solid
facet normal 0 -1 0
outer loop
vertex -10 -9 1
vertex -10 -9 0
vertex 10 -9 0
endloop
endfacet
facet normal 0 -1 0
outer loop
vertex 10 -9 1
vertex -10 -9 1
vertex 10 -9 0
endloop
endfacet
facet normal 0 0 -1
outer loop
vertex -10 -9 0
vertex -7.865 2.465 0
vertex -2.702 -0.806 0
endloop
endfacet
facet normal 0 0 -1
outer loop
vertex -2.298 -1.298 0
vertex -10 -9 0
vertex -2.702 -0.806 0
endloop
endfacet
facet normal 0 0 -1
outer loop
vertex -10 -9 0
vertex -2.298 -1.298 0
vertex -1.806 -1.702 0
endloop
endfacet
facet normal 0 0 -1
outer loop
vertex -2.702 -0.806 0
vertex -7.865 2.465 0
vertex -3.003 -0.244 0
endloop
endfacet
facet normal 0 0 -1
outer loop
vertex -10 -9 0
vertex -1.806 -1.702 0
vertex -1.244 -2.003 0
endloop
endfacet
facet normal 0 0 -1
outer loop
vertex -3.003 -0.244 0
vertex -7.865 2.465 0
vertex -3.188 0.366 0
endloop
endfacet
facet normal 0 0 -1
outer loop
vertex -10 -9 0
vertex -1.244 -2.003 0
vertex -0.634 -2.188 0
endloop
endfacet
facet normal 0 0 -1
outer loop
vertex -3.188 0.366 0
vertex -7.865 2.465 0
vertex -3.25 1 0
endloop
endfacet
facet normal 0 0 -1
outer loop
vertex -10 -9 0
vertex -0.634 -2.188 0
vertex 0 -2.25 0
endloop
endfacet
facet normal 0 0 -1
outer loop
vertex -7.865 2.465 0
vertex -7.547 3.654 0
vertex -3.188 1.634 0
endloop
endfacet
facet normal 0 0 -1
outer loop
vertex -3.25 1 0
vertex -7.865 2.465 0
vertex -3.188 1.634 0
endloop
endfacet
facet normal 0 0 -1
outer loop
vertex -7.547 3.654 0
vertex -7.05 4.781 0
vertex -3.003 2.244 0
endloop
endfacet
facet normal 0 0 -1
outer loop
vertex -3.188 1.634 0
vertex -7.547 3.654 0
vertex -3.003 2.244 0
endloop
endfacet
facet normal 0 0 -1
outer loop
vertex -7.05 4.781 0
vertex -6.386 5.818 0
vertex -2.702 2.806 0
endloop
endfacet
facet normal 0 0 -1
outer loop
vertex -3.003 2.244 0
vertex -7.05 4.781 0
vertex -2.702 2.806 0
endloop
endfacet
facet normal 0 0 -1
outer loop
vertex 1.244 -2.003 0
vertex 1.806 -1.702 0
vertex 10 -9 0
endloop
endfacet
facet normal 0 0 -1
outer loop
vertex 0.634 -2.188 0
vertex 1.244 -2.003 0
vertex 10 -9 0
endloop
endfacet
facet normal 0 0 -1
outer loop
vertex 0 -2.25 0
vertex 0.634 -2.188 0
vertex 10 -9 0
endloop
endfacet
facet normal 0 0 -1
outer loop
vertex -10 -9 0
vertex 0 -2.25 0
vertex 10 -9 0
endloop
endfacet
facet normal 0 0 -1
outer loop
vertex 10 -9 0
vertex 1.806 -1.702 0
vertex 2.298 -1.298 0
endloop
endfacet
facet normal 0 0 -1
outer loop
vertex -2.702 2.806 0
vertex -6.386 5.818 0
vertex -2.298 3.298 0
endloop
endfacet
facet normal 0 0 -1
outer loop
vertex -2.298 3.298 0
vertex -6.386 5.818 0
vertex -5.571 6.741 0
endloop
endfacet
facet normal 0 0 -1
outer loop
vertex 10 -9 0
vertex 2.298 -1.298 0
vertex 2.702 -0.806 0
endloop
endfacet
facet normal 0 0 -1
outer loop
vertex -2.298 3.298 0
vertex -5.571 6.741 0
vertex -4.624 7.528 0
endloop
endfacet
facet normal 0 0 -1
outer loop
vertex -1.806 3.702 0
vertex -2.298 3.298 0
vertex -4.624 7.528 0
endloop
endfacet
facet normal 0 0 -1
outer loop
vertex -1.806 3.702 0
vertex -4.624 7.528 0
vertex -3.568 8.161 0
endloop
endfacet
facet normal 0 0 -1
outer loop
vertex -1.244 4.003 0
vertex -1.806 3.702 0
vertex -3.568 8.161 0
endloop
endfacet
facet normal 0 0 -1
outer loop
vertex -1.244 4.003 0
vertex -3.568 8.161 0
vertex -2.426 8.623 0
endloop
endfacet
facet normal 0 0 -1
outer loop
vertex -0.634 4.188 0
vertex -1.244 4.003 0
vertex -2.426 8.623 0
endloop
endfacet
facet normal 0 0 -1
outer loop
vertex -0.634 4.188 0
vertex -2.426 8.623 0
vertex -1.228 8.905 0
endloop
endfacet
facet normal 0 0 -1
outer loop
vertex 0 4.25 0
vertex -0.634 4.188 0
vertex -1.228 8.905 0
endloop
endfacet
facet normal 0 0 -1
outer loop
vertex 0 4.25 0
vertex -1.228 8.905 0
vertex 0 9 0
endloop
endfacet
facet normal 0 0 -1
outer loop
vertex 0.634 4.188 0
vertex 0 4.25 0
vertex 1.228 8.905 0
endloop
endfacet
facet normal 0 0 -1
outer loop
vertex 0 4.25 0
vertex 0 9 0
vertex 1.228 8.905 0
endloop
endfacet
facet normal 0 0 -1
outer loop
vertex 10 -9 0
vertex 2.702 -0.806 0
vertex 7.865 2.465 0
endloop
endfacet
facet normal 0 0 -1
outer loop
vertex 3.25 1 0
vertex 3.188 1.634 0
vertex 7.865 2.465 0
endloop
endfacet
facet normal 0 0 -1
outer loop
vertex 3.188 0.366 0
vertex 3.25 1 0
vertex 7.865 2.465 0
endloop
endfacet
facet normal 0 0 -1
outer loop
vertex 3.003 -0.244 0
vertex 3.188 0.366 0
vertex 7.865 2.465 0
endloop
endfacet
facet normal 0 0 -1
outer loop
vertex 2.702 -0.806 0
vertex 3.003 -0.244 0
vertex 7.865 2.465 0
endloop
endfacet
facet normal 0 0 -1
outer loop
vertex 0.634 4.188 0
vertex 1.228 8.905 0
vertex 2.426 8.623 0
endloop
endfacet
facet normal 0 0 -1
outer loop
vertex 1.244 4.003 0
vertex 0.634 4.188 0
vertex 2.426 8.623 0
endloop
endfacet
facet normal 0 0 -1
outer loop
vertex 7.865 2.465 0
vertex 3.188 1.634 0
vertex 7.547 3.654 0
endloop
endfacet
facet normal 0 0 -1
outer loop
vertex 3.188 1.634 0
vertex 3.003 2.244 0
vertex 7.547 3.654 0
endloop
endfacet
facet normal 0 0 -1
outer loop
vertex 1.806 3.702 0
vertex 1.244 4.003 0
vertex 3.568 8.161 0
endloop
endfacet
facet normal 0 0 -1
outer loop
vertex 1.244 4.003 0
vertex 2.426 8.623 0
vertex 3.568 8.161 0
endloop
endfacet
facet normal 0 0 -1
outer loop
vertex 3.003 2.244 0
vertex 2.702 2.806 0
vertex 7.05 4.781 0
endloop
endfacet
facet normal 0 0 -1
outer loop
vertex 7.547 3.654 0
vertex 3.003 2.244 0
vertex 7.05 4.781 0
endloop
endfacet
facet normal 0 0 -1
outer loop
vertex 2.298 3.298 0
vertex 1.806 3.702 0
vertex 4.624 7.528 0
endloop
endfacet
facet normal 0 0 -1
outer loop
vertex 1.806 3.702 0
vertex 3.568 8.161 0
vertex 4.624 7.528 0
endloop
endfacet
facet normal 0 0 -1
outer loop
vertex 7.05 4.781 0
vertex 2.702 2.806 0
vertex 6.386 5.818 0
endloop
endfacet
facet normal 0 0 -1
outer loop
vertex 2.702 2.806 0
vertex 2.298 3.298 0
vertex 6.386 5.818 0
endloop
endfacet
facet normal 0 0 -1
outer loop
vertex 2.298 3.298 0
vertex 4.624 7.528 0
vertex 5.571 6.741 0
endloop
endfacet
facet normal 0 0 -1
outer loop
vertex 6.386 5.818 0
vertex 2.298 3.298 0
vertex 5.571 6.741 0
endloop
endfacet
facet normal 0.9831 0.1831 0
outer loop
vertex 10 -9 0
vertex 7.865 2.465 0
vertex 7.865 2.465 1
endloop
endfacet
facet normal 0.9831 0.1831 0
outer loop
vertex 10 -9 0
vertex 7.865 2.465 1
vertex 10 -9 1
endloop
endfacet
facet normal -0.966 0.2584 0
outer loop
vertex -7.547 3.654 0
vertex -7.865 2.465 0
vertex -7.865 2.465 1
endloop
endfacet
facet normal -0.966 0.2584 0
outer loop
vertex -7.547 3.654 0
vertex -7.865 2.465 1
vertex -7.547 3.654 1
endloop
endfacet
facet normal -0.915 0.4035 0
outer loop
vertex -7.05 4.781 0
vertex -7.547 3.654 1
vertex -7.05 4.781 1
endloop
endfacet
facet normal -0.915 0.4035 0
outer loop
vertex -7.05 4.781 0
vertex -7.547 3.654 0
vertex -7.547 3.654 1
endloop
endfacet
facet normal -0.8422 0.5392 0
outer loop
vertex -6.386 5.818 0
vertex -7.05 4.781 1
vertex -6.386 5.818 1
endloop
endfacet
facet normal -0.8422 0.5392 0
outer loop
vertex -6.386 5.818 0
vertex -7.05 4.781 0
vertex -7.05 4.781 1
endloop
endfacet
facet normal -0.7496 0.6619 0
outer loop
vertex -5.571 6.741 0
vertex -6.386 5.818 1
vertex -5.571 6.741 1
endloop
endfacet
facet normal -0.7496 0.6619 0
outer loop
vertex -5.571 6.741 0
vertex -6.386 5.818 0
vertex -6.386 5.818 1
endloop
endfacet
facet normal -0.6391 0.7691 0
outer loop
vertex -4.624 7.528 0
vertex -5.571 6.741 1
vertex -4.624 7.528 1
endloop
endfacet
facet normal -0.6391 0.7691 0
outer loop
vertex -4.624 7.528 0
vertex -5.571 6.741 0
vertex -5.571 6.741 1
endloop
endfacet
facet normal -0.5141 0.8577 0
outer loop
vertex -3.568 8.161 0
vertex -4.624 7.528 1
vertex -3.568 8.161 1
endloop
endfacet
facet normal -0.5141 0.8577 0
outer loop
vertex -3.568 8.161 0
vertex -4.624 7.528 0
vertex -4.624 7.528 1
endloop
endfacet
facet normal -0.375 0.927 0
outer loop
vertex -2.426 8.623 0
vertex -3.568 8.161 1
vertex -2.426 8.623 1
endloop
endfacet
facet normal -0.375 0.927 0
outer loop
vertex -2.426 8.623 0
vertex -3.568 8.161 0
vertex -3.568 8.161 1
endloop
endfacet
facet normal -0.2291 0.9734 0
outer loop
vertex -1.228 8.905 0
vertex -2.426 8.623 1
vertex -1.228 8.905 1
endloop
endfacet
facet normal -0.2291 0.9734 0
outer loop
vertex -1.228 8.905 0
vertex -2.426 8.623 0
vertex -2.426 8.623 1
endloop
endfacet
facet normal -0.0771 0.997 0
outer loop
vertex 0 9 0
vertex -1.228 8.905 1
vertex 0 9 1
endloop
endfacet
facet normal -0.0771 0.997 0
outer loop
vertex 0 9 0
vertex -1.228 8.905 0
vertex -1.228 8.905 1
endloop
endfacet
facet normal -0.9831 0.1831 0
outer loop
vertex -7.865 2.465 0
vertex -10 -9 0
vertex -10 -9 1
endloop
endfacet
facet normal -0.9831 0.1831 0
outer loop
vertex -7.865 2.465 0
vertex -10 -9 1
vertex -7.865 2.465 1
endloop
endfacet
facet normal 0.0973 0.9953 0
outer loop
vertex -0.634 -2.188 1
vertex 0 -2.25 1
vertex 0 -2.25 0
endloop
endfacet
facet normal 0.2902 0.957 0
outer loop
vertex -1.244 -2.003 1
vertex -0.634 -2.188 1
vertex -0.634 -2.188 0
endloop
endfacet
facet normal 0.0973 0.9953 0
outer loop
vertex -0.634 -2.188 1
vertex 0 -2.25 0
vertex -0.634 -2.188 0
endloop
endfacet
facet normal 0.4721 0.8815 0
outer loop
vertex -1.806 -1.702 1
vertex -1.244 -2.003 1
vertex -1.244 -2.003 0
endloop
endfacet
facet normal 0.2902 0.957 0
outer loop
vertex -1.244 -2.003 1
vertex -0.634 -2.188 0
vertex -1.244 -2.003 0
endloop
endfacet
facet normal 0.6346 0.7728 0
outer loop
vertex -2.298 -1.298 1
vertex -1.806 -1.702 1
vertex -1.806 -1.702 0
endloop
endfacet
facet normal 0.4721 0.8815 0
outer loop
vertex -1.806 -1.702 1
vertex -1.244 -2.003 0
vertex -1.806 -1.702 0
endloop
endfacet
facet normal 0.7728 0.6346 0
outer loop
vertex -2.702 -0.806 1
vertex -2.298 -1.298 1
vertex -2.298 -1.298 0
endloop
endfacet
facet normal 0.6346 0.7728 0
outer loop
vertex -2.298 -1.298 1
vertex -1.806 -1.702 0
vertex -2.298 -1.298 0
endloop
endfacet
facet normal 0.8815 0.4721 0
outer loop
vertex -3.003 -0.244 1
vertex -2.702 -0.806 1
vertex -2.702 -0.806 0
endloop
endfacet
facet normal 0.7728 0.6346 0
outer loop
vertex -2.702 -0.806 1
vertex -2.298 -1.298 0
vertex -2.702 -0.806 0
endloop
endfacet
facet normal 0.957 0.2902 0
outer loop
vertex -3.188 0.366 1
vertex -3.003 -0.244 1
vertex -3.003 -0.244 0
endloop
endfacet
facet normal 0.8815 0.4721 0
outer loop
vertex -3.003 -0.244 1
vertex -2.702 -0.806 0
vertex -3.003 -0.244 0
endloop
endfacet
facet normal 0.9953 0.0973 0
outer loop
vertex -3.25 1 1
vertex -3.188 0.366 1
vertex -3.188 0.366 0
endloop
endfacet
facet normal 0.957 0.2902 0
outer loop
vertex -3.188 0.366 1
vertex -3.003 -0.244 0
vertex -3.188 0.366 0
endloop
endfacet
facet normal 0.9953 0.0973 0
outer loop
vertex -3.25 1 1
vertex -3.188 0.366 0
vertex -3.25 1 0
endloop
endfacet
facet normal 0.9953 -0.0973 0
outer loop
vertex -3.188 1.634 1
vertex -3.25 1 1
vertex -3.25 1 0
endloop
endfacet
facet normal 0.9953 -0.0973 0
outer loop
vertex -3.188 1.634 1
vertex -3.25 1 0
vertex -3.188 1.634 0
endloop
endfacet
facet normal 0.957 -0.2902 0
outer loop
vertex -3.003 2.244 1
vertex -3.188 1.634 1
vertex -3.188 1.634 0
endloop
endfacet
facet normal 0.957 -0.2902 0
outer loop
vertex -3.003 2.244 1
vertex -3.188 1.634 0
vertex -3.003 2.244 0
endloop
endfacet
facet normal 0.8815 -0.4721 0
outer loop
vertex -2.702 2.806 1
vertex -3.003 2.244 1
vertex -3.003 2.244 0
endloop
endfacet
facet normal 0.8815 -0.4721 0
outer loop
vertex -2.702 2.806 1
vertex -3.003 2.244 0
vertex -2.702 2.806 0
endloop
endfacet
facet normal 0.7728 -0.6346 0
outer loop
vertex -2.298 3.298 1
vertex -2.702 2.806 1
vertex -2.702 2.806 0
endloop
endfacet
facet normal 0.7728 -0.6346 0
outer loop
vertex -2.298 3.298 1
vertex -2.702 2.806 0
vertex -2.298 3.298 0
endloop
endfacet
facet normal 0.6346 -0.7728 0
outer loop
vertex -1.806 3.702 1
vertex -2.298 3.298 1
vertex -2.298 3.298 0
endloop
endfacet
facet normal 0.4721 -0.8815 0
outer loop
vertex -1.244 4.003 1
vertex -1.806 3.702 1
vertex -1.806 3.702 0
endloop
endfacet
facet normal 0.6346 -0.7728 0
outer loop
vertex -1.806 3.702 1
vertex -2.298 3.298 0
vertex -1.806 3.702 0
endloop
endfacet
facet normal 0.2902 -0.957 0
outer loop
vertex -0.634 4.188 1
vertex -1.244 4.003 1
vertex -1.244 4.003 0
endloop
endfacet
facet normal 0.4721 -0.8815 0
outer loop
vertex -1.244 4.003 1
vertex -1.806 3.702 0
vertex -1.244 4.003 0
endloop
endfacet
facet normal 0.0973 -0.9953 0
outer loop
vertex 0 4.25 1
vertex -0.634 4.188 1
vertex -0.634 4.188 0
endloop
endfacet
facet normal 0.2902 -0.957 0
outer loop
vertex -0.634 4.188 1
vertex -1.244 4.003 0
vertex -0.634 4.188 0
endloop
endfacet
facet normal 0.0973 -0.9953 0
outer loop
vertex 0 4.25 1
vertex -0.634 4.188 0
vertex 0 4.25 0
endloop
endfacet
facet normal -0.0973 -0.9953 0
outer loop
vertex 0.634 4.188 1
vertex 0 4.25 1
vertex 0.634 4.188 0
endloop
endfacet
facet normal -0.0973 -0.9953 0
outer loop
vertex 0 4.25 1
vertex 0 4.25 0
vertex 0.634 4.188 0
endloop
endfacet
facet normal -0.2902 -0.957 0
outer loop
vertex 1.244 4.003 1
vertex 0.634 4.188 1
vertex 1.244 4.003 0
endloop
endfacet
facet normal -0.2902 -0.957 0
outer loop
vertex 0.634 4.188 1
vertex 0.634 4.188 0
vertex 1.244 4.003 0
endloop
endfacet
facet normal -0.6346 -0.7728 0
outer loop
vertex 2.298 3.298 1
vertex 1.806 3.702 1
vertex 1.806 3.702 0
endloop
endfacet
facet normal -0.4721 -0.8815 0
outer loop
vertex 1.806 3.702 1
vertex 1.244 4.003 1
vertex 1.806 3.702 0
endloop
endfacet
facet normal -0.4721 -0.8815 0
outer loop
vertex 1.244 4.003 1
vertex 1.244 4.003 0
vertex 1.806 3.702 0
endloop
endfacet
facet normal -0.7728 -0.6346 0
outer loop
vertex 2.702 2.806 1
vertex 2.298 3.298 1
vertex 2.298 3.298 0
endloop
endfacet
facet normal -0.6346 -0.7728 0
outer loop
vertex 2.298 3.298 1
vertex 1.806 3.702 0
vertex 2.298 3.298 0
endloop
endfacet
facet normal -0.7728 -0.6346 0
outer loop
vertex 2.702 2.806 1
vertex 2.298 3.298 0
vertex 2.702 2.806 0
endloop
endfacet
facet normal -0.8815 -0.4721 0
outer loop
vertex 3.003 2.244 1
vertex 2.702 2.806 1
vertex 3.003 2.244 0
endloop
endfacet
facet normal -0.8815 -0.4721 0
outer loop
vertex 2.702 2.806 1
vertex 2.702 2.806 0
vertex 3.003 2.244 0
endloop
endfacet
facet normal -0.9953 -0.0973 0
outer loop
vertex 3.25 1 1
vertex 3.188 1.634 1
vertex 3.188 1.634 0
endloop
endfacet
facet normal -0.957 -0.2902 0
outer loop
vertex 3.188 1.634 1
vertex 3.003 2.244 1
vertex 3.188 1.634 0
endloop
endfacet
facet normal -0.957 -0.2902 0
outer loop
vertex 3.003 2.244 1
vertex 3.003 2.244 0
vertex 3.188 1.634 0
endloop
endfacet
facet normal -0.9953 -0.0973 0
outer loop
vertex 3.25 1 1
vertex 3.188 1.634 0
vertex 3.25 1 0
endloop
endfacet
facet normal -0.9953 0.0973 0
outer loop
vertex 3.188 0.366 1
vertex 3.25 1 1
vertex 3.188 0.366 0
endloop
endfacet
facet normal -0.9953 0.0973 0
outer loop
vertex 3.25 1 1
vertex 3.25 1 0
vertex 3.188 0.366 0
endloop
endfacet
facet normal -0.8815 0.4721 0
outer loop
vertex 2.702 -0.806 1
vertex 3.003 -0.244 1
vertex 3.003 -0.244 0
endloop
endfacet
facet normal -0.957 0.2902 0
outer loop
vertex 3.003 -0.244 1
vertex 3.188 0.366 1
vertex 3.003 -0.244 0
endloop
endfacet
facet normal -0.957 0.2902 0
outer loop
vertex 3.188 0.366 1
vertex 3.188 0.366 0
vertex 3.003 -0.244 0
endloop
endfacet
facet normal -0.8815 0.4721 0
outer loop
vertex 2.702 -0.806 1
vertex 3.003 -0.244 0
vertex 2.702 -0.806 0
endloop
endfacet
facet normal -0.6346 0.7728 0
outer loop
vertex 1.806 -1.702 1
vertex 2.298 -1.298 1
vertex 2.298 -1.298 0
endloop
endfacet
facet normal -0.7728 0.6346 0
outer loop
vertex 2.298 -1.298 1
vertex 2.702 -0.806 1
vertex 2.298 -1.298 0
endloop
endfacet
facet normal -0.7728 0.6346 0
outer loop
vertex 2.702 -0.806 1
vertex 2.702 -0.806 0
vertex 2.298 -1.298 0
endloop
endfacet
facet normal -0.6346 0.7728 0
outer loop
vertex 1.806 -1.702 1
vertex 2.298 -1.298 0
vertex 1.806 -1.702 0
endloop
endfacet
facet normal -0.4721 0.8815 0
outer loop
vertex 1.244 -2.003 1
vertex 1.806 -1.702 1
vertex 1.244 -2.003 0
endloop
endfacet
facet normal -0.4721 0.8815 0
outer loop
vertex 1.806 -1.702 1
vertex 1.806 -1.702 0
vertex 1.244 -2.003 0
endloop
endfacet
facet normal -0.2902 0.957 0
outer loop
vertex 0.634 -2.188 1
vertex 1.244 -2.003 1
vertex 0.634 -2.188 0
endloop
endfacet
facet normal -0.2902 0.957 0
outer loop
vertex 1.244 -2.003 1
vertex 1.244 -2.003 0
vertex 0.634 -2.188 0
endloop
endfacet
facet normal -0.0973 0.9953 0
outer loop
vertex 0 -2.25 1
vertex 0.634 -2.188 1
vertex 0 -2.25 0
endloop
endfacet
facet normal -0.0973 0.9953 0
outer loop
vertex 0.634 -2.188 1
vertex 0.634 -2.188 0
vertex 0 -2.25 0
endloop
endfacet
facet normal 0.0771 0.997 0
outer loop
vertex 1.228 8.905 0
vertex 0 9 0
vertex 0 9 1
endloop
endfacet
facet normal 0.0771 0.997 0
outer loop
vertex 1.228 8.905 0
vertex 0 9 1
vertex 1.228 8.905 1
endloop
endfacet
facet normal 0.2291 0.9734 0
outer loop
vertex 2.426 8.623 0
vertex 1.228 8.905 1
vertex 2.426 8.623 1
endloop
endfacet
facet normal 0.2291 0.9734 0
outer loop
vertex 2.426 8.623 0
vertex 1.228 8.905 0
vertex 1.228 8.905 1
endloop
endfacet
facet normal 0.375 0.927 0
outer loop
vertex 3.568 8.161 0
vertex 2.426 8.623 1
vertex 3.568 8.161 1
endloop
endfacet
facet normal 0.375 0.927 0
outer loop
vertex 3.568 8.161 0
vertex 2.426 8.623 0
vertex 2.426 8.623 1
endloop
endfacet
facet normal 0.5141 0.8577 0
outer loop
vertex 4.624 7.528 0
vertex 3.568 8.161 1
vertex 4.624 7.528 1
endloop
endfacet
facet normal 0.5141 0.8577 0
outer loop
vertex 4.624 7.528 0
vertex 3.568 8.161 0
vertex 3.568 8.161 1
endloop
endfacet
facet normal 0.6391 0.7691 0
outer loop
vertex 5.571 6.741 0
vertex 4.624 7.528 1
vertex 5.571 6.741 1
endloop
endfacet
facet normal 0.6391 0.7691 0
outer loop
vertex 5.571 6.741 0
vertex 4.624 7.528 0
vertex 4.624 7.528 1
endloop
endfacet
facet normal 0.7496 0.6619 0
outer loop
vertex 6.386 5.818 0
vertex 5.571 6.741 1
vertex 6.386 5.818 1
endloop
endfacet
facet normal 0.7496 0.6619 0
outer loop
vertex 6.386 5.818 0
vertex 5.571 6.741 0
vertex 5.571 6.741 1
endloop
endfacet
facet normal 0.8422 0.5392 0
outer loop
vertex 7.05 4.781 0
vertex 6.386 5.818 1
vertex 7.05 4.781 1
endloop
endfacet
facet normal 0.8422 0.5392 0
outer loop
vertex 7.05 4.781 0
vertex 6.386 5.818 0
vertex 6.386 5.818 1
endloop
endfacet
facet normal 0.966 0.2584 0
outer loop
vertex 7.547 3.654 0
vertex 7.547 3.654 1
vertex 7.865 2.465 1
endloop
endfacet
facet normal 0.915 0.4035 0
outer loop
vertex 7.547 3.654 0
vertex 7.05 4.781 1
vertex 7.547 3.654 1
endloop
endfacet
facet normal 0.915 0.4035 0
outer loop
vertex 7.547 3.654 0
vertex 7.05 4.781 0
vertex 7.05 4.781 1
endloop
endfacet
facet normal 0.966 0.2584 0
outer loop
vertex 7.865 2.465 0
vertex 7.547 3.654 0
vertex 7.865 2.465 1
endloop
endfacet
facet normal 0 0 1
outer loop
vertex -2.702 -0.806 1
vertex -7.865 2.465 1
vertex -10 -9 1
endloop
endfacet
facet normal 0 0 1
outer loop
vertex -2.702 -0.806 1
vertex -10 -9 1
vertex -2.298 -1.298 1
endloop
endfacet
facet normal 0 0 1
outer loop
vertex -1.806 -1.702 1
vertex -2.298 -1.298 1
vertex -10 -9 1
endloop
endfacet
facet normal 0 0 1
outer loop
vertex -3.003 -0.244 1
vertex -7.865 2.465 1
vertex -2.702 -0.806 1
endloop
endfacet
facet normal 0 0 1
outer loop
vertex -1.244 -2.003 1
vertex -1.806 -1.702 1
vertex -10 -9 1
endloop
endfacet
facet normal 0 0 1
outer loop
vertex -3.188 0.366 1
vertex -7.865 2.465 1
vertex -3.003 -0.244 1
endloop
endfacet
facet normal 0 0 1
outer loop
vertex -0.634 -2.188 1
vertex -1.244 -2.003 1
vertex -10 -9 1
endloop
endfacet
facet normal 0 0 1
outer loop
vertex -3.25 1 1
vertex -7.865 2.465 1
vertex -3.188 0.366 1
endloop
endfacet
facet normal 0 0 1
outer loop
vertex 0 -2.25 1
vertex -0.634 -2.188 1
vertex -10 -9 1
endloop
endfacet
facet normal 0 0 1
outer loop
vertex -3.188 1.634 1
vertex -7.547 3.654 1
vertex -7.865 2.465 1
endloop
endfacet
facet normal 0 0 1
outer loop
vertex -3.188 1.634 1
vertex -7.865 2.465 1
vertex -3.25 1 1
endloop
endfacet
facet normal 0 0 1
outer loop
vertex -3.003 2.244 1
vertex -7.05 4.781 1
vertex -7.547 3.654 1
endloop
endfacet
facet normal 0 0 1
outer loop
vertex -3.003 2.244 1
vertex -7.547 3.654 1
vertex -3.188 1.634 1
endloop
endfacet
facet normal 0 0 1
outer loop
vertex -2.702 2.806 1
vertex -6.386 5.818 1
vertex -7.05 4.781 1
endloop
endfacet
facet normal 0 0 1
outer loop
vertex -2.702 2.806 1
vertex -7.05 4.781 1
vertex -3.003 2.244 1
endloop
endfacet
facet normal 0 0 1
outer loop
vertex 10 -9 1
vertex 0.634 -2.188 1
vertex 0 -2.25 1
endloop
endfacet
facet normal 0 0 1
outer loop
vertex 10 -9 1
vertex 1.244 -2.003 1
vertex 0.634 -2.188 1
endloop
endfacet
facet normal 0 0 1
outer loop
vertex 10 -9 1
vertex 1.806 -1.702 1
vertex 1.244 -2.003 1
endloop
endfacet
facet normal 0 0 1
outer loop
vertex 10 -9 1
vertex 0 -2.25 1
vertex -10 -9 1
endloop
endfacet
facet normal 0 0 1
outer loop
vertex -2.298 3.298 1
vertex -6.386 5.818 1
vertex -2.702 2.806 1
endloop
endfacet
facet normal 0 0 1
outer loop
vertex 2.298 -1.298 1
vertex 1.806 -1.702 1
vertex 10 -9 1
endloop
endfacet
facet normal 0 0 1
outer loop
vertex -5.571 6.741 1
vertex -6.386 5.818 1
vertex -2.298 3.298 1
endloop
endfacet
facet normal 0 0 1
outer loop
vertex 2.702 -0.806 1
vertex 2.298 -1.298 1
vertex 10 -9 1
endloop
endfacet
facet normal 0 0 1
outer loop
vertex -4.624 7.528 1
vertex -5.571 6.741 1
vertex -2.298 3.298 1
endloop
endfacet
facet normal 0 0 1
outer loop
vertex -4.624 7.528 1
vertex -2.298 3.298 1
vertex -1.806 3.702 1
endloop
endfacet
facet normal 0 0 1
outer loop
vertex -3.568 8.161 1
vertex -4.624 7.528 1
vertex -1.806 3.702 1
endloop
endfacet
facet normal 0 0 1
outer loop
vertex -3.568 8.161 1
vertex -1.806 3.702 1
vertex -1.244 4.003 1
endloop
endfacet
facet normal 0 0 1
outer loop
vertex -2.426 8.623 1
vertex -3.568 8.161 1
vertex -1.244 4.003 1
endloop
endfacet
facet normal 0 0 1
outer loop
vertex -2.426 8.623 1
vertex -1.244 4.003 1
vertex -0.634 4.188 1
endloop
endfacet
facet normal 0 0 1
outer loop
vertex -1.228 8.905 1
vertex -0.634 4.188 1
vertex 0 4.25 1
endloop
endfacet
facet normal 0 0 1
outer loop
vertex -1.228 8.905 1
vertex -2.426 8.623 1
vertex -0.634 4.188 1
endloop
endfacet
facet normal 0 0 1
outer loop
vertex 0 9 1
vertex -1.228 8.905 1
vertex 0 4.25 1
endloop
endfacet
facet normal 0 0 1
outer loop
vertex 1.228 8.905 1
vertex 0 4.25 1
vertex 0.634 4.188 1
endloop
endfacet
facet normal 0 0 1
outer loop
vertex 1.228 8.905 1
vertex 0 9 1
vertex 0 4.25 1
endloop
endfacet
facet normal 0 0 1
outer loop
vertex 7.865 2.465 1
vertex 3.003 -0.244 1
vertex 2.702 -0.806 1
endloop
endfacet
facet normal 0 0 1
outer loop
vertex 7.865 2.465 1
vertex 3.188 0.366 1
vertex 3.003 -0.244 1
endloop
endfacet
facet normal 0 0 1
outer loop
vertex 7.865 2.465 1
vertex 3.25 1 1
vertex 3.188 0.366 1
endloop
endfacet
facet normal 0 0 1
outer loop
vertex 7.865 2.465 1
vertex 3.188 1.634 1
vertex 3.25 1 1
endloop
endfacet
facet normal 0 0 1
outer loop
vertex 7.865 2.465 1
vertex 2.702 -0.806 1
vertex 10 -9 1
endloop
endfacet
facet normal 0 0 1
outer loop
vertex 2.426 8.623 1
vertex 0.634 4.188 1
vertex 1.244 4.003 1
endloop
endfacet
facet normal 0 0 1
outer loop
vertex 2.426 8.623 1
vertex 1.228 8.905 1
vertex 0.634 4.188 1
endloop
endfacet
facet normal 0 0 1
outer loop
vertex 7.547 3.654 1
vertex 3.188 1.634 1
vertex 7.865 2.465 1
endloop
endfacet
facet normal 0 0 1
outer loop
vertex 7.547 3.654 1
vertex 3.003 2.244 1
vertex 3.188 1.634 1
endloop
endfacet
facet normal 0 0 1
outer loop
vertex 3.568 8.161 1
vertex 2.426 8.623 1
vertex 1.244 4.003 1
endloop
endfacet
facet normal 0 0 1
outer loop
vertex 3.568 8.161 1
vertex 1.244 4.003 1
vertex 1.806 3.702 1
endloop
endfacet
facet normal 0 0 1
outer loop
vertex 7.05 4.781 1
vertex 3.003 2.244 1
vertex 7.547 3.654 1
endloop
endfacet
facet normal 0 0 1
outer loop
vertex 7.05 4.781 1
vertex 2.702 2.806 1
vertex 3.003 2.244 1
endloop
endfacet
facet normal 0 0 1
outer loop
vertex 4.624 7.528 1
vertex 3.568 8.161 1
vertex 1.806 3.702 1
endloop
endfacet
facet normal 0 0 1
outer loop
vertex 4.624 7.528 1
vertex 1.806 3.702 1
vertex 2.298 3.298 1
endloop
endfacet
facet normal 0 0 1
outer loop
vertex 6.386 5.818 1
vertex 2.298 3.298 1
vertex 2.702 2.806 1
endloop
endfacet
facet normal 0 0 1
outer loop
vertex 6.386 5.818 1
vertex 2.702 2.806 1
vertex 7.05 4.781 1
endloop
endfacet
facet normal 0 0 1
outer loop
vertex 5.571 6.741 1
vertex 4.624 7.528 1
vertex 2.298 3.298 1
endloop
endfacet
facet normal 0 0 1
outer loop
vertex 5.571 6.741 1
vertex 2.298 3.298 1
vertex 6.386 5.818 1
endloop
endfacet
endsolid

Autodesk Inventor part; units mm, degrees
ref_plane "YZ Plane" through (0, 0, 0) normal (1, 0, 0) x (0, 1, 0)
ref_plane "XZ Plane" through (0, 0, 0) normal (0, 1, 0) x (-1, 0, 0)
ref_plane "XY Plane" through (0, 0, 0) normal (0, 0, 1) x (1, 0, 0)
sketch "Эскиз1" plane through (0, 0, 0) normal (0, 0, 1) x (1, 0, 0)
  line L0 (0, 9) -> (0, -9) construction
  line L1 (0, -9) -> (10, -9)
  arc A0 (0, -2.25) -> (0, 4.25) centre (0, 1) ccw
  arc A1 (7.8648, 2.4648) -> (0, 9) centre (0, 1) ccw
  line L2 (7.8648, 2.4648) -> (10, -9)
  line L3 (0, 9) -> (0, 4.25)
  line L4 (0, -2.25) -> (0, -9)
  point P0 (0, 0)
  point P1 (0, 0)
  dimension "d0" = 18
  dimension "d1" = 10
  dimension "d2" = 3.25
  dimension "d3" = 10
extrude "Выдавливание1" add sketch "Эскиз1" along normal blind 1
mirror "Зеркальное отражение1" about plane through (0, 0, 0) normal (1, 0, 0) of "Выдавливание1"
properties part number "76. Стопор штуцера"
